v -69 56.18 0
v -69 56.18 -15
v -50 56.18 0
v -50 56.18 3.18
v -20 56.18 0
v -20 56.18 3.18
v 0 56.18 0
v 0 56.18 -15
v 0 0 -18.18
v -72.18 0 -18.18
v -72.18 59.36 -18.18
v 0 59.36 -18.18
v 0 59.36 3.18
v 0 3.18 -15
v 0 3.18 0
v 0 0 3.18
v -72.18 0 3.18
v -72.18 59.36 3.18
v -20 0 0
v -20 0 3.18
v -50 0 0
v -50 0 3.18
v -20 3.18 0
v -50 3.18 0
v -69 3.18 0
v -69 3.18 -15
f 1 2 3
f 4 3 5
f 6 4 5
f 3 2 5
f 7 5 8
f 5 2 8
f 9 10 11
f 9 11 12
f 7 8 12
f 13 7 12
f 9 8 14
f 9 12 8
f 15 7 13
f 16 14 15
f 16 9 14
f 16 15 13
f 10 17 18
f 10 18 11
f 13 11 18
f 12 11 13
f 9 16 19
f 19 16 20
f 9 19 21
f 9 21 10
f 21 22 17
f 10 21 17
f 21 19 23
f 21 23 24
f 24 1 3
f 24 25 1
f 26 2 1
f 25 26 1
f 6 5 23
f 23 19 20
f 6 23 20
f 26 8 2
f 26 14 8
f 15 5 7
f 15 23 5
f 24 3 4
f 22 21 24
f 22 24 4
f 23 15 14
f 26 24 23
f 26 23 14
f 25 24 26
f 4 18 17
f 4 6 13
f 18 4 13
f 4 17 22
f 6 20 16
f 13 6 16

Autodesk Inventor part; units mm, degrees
ref_plane "YZ Plane" through (0, 0, 0) normal (1, 0, 0) x (0, 1, 0)
ref_plane "XZ Plane" through (0, 0, 0) normal (0, 1, 0) x (-1, 0, 0)
ref_plane "XY Plane" through (0, 0, 0) normal (0, 0, 1) x (1, 0, 0)
sketch "Sketch1" plane through (0, 0, 0) normal (0, 1, 0) x (-1, 0, 0)
  line L0 (0, 0) -> (69, 0)
  line L1 (69, 0) -> (69, -15)
  line L2 (69, -15) -> (0, -15)
  line L3 (0, -15) -> (0, 0)
  dimension "d0" = 69
  dimension "d1" = 15
extrude "Extrusion1" add sketch "Sketch1" along normal blind 3.18
sketch "Sketch2" plane through (0, 0, 0) normal (0, 1, 0) x (-1, 0, 0)
  line L0 (69, 0) -> (0, 0) projected
  line L1 (0, 0) -> (0, -15) projected
  line L2 (0, -15) -> (69, -15) projected
  line L3 (69, -15) -> (69, 0) projected
  line L4 (0, -15) -> (72.18, -15)
  line L5 (72.18, -15) -> (72.18, -18.18)
  line L6 (72.18, -18.18) -> (0, -18.18)
  line L7 (0, -18.18) -> (0, -15)
  line L8 (72.18, -15) -> (69, -15)
  line L9 (69, -15) -> (69, 0)
  line L10 (69, 0) -> (72.18, 0)
  line L11 (72.18, 0) -> (72.18, -15)
  line L12 (0, 0) -> (20, 0)
  line L13 (20, 0) -> (20, 3.18)
  line L14 (20, 3.18) -> (0, 3.18)
  line L15 (0, 3.18) -> (0, 0)
  line L16 (20, 0) -> (50, 0)
  line L17 (50, 0) -> (50, 3.18)
  line L18 (20, 3.18) -> (20, 0)
  line L19 (50, 3.18) -> (72.18, 3.18)
  line L20 (72.18, 3.18) -> (72.18, 0)
  line L21 (72.18, 0) -> (50, 0)
  line L22 (50, 0) -> (50, 3.18)
  dimension "d4" = 72.18
  dimension "d5" = 3.18
  dimension "d6" = 20
  dimension "d7" = 3.18
  dimension "d9" = 22.18
extrude "Extrusion2" add sketch "Sketch2" along normal blind 56.18 contours L10 L11 L4 L3 | L0 L17 L19 L20 L10 | L4 L5 L6 L7 L2 | L0 L15 L14 L13
sketch "Sketch3" plane through (0, 56.18, 0) normal (0, 1, 0) x (1, 0, 0)
  line L0 (0, 0) -> (-20, 0) projected
  line L1 (-20, 0) -> (-20, -3.18) projected
  line L2 (-20, -3.18) -> (0, -3.18) projected
  line L3 (0, -3.18) -> (0, 0) projected
  line L4 (-69, 0) -> (-69, 15) projected
  line L5 (-69, 15) -> (0, 15) projected
  line L6 (0, 15) -> (0, 18.18) projected
  line L7 (0, 18.18) -> (-72.18, 18.18) projected
  line L8 (-72.18, 18.18) -> (-72.18, -3.18) projected
  line L9 (-72.18, -3.18) -> (-50, -3.18) projected
  line L10 (-50, -3.18) -> (-50, 0) projected
  line L11 (-50, 0) -> (-69, 0) projected
  line L12 (0, -3.18) -> (-72.18, -3.18)
  line L13 (-72.18, -3.18) -> (-72.18, 18.18)
  line L14 (-72.18, 18.18) -> (0, 18.18)
  line L15 (0, 18.18) -> (0, -3.18)
extrude "Extrusion3" add sketch "Sketch3" along normal blind 3.18
properties part number "Base_Arduino"
